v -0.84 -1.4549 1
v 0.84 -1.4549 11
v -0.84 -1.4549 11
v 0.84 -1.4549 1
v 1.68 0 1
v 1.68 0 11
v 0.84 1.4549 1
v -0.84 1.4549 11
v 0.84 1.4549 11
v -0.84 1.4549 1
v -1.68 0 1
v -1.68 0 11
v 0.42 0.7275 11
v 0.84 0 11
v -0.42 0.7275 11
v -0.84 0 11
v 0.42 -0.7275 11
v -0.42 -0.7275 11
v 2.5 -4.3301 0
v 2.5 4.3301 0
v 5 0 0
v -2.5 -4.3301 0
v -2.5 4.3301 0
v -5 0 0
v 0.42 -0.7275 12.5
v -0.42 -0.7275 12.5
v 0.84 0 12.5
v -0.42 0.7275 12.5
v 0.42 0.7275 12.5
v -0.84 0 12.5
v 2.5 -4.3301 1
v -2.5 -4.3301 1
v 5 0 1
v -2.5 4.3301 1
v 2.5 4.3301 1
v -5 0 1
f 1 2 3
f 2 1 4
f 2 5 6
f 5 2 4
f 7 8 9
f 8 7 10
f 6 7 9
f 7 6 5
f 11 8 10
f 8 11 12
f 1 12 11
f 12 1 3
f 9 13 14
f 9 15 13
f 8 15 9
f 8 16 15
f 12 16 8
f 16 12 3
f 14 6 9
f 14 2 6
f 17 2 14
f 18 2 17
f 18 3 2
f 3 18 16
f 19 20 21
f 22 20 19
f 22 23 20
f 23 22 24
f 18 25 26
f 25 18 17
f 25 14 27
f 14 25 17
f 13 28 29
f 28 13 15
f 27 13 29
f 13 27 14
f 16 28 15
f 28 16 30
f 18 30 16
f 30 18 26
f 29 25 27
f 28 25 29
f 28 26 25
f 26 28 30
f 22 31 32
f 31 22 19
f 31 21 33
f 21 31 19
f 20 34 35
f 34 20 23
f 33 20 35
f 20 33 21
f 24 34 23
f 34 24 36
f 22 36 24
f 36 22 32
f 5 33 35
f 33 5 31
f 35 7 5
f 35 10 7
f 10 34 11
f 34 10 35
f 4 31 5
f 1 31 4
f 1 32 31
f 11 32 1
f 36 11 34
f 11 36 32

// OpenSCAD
// file: cookie_cutter.scad
module dxf(file, layer, height) {
   linear_extrude(height = height)
       import(file = file, layer = layer);
}

module needle(height, thin1, thin2) {
   union() {
      cylinder(r = thin1, h = height-1.5, $fn = 6);
      cylinder(r = thin2, h = height, $fn = 6);
   }
}

module wall(file, layer, height, thin) {
   difference() {
      minkowski() {
        dxf(file, layer, 0.01);
        cylinder(r = thin, h = height, $fn = 6);
      }
      translate([0, 0, -1]) dxf(file, layer, height + 2);
   }
}

module cutter(file, layer, height, nozzle_diameter) {
   thin1 = nozzle_diameter * 2.4;
   thin2 = nozzle_diameter * 1.2;
   difference() {
      minkowski() {
        dxf(file, layer, 0.01);
        needle(height, thin1, thin2);
      }
      translate([0, 0, -1]) dxf(file, layer, height + 2);
   }
}

module cookie_cutter(file, height, join_height, nozzle_diameter) {
   union () {
      cutter(file, "cutter", height, nozzle_diameter);
      wall(file, "outer", 1, 5);
   }
}

module cookie_cutter_join(file, height, join_height, nozzle_diameter) {
   union () {
      cutter(file, "cutter", height, nozzle_diameter);
      wall(file, "outer", 1, 5);
      linear_extrude(height = join_height)
         import(file = file, layer = "join");
   }
}
// main file
include <cookie_cutter.scad>;
cookie_cutter_join("batman.dxf", 12.5, 1, 0.7);
